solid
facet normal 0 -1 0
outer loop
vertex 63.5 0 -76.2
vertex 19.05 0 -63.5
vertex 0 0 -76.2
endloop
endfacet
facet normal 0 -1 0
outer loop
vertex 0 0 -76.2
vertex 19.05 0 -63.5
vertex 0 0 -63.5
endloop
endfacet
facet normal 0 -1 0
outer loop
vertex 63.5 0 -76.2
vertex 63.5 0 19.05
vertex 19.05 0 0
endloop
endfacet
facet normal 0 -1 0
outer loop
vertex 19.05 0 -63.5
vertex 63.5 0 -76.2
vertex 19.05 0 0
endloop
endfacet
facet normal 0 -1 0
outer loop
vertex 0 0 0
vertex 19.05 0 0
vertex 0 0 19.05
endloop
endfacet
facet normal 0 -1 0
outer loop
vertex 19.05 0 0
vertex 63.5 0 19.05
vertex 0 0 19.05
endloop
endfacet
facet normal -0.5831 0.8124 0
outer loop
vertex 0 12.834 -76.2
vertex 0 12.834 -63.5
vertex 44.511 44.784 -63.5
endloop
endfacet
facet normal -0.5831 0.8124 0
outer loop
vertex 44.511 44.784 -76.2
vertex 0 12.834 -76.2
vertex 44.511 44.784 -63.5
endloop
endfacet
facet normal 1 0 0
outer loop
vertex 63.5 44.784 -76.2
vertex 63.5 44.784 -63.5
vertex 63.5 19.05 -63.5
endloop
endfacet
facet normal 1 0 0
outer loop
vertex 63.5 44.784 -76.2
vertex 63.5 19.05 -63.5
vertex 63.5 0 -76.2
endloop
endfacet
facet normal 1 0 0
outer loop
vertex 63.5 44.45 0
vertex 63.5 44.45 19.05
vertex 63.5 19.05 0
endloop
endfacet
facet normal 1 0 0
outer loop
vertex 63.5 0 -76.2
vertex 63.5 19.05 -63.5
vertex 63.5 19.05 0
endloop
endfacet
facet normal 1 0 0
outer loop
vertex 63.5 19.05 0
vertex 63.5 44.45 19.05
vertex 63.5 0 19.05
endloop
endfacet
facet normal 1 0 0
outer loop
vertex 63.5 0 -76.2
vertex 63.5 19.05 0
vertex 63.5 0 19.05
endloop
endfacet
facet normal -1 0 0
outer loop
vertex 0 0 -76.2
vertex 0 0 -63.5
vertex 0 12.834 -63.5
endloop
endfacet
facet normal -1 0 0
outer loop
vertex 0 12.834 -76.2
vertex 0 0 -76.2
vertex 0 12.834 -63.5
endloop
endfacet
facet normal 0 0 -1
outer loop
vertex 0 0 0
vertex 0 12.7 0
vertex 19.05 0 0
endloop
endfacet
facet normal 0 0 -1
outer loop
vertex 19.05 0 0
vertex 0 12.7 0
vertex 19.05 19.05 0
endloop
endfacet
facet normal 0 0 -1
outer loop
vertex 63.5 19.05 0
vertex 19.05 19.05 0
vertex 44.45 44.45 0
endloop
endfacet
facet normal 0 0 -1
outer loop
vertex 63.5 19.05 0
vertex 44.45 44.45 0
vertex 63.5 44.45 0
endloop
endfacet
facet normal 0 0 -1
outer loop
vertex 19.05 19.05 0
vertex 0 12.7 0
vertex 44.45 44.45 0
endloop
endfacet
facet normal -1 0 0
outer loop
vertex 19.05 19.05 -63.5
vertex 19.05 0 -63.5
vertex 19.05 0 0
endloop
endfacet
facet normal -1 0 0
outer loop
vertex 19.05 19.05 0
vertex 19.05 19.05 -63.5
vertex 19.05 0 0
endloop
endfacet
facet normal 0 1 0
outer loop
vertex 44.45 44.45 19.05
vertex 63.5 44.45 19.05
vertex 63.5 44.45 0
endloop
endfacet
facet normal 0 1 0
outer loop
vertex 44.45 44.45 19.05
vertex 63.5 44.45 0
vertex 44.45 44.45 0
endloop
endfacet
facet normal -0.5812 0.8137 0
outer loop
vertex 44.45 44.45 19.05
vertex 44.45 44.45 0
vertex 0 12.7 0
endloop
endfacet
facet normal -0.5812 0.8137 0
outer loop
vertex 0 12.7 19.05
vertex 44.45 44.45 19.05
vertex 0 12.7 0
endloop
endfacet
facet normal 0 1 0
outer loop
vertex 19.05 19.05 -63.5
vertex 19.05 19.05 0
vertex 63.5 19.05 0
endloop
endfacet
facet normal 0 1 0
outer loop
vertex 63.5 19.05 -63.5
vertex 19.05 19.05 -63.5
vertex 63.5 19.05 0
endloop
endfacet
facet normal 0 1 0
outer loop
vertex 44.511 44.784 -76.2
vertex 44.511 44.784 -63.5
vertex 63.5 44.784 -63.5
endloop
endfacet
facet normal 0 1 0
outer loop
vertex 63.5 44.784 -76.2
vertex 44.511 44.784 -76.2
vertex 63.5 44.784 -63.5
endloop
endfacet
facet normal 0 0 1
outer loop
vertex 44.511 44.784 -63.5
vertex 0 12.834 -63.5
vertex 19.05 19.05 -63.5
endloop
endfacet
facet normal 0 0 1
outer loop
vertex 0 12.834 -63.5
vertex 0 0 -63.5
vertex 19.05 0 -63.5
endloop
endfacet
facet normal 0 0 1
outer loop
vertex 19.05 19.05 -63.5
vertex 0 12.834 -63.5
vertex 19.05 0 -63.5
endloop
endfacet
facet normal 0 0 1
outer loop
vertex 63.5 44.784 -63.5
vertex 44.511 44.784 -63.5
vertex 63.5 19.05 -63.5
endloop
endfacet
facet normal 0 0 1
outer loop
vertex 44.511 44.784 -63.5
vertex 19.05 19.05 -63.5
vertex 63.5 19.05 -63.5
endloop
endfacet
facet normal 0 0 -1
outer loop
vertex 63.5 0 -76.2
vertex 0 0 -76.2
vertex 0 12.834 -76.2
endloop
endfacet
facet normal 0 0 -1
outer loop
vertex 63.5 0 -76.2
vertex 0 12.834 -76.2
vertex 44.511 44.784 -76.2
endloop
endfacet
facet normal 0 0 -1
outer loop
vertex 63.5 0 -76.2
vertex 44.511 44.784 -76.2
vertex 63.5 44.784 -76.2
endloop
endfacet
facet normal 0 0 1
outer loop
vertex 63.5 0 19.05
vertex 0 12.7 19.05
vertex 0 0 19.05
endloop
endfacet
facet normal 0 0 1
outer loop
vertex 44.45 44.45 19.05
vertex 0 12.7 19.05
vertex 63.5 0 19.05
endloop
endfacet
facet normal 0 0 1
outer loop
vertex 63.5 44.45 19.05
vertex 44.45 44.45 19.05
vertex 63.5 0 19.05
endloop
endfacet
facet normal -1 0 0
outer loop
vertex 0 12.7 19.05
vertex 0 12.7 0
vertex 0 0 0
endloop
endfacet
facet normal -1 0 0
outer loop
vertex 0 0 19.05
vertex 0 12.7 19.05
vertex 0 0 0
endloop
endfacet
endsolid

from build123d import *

# Parameters (mm, degrees)
F1_DEPTH = 19.05
F2_W     = 44.45
F2_H     = 63.5
F3_DEPTH = 19.05
F4_W     = 44.45
F4_H     = 19.05
F5_DEPTH = 12.7


with BuildPart() as f1:
    # F0 (on Top) → F1 (new body)
    with BuildSketch(Plane.XY):
        Polygon((0, 12.7), (0, 0), (63.5, 0), (63.5, 44.45), (44.45, 44.45), align=None)
    extrude(amount=F1_DEPTH)

    # F2 (on Front) → F3 (join)
    with BuildSketch(Plane.XZ):
        with Locations((41.275, -31.75)):
            Rectangle(F2_W, F2_H)
    extrude(amount=-F3_DEPTH)

    # F4 (on face) → F5 (join)
    with BuildSketch(Plane(origin=(0, 0, -63.5), x_dir=(1, 0, 0), z_dir=(0, 0, -1))):
        Polygon((19.05, 0), (0, 0), (0, -12.8343682736), (44.5106774569, -44.7837524116), (63.5, -44.7837524116), (63.5, -19.05), (19.05, -19.05), align=None)
        with Locations((41.275, -9.525)):
            Rectangle(F4_W, F4_H)
    extrude(amount=F5_DEPTH)


solid = f1.part
